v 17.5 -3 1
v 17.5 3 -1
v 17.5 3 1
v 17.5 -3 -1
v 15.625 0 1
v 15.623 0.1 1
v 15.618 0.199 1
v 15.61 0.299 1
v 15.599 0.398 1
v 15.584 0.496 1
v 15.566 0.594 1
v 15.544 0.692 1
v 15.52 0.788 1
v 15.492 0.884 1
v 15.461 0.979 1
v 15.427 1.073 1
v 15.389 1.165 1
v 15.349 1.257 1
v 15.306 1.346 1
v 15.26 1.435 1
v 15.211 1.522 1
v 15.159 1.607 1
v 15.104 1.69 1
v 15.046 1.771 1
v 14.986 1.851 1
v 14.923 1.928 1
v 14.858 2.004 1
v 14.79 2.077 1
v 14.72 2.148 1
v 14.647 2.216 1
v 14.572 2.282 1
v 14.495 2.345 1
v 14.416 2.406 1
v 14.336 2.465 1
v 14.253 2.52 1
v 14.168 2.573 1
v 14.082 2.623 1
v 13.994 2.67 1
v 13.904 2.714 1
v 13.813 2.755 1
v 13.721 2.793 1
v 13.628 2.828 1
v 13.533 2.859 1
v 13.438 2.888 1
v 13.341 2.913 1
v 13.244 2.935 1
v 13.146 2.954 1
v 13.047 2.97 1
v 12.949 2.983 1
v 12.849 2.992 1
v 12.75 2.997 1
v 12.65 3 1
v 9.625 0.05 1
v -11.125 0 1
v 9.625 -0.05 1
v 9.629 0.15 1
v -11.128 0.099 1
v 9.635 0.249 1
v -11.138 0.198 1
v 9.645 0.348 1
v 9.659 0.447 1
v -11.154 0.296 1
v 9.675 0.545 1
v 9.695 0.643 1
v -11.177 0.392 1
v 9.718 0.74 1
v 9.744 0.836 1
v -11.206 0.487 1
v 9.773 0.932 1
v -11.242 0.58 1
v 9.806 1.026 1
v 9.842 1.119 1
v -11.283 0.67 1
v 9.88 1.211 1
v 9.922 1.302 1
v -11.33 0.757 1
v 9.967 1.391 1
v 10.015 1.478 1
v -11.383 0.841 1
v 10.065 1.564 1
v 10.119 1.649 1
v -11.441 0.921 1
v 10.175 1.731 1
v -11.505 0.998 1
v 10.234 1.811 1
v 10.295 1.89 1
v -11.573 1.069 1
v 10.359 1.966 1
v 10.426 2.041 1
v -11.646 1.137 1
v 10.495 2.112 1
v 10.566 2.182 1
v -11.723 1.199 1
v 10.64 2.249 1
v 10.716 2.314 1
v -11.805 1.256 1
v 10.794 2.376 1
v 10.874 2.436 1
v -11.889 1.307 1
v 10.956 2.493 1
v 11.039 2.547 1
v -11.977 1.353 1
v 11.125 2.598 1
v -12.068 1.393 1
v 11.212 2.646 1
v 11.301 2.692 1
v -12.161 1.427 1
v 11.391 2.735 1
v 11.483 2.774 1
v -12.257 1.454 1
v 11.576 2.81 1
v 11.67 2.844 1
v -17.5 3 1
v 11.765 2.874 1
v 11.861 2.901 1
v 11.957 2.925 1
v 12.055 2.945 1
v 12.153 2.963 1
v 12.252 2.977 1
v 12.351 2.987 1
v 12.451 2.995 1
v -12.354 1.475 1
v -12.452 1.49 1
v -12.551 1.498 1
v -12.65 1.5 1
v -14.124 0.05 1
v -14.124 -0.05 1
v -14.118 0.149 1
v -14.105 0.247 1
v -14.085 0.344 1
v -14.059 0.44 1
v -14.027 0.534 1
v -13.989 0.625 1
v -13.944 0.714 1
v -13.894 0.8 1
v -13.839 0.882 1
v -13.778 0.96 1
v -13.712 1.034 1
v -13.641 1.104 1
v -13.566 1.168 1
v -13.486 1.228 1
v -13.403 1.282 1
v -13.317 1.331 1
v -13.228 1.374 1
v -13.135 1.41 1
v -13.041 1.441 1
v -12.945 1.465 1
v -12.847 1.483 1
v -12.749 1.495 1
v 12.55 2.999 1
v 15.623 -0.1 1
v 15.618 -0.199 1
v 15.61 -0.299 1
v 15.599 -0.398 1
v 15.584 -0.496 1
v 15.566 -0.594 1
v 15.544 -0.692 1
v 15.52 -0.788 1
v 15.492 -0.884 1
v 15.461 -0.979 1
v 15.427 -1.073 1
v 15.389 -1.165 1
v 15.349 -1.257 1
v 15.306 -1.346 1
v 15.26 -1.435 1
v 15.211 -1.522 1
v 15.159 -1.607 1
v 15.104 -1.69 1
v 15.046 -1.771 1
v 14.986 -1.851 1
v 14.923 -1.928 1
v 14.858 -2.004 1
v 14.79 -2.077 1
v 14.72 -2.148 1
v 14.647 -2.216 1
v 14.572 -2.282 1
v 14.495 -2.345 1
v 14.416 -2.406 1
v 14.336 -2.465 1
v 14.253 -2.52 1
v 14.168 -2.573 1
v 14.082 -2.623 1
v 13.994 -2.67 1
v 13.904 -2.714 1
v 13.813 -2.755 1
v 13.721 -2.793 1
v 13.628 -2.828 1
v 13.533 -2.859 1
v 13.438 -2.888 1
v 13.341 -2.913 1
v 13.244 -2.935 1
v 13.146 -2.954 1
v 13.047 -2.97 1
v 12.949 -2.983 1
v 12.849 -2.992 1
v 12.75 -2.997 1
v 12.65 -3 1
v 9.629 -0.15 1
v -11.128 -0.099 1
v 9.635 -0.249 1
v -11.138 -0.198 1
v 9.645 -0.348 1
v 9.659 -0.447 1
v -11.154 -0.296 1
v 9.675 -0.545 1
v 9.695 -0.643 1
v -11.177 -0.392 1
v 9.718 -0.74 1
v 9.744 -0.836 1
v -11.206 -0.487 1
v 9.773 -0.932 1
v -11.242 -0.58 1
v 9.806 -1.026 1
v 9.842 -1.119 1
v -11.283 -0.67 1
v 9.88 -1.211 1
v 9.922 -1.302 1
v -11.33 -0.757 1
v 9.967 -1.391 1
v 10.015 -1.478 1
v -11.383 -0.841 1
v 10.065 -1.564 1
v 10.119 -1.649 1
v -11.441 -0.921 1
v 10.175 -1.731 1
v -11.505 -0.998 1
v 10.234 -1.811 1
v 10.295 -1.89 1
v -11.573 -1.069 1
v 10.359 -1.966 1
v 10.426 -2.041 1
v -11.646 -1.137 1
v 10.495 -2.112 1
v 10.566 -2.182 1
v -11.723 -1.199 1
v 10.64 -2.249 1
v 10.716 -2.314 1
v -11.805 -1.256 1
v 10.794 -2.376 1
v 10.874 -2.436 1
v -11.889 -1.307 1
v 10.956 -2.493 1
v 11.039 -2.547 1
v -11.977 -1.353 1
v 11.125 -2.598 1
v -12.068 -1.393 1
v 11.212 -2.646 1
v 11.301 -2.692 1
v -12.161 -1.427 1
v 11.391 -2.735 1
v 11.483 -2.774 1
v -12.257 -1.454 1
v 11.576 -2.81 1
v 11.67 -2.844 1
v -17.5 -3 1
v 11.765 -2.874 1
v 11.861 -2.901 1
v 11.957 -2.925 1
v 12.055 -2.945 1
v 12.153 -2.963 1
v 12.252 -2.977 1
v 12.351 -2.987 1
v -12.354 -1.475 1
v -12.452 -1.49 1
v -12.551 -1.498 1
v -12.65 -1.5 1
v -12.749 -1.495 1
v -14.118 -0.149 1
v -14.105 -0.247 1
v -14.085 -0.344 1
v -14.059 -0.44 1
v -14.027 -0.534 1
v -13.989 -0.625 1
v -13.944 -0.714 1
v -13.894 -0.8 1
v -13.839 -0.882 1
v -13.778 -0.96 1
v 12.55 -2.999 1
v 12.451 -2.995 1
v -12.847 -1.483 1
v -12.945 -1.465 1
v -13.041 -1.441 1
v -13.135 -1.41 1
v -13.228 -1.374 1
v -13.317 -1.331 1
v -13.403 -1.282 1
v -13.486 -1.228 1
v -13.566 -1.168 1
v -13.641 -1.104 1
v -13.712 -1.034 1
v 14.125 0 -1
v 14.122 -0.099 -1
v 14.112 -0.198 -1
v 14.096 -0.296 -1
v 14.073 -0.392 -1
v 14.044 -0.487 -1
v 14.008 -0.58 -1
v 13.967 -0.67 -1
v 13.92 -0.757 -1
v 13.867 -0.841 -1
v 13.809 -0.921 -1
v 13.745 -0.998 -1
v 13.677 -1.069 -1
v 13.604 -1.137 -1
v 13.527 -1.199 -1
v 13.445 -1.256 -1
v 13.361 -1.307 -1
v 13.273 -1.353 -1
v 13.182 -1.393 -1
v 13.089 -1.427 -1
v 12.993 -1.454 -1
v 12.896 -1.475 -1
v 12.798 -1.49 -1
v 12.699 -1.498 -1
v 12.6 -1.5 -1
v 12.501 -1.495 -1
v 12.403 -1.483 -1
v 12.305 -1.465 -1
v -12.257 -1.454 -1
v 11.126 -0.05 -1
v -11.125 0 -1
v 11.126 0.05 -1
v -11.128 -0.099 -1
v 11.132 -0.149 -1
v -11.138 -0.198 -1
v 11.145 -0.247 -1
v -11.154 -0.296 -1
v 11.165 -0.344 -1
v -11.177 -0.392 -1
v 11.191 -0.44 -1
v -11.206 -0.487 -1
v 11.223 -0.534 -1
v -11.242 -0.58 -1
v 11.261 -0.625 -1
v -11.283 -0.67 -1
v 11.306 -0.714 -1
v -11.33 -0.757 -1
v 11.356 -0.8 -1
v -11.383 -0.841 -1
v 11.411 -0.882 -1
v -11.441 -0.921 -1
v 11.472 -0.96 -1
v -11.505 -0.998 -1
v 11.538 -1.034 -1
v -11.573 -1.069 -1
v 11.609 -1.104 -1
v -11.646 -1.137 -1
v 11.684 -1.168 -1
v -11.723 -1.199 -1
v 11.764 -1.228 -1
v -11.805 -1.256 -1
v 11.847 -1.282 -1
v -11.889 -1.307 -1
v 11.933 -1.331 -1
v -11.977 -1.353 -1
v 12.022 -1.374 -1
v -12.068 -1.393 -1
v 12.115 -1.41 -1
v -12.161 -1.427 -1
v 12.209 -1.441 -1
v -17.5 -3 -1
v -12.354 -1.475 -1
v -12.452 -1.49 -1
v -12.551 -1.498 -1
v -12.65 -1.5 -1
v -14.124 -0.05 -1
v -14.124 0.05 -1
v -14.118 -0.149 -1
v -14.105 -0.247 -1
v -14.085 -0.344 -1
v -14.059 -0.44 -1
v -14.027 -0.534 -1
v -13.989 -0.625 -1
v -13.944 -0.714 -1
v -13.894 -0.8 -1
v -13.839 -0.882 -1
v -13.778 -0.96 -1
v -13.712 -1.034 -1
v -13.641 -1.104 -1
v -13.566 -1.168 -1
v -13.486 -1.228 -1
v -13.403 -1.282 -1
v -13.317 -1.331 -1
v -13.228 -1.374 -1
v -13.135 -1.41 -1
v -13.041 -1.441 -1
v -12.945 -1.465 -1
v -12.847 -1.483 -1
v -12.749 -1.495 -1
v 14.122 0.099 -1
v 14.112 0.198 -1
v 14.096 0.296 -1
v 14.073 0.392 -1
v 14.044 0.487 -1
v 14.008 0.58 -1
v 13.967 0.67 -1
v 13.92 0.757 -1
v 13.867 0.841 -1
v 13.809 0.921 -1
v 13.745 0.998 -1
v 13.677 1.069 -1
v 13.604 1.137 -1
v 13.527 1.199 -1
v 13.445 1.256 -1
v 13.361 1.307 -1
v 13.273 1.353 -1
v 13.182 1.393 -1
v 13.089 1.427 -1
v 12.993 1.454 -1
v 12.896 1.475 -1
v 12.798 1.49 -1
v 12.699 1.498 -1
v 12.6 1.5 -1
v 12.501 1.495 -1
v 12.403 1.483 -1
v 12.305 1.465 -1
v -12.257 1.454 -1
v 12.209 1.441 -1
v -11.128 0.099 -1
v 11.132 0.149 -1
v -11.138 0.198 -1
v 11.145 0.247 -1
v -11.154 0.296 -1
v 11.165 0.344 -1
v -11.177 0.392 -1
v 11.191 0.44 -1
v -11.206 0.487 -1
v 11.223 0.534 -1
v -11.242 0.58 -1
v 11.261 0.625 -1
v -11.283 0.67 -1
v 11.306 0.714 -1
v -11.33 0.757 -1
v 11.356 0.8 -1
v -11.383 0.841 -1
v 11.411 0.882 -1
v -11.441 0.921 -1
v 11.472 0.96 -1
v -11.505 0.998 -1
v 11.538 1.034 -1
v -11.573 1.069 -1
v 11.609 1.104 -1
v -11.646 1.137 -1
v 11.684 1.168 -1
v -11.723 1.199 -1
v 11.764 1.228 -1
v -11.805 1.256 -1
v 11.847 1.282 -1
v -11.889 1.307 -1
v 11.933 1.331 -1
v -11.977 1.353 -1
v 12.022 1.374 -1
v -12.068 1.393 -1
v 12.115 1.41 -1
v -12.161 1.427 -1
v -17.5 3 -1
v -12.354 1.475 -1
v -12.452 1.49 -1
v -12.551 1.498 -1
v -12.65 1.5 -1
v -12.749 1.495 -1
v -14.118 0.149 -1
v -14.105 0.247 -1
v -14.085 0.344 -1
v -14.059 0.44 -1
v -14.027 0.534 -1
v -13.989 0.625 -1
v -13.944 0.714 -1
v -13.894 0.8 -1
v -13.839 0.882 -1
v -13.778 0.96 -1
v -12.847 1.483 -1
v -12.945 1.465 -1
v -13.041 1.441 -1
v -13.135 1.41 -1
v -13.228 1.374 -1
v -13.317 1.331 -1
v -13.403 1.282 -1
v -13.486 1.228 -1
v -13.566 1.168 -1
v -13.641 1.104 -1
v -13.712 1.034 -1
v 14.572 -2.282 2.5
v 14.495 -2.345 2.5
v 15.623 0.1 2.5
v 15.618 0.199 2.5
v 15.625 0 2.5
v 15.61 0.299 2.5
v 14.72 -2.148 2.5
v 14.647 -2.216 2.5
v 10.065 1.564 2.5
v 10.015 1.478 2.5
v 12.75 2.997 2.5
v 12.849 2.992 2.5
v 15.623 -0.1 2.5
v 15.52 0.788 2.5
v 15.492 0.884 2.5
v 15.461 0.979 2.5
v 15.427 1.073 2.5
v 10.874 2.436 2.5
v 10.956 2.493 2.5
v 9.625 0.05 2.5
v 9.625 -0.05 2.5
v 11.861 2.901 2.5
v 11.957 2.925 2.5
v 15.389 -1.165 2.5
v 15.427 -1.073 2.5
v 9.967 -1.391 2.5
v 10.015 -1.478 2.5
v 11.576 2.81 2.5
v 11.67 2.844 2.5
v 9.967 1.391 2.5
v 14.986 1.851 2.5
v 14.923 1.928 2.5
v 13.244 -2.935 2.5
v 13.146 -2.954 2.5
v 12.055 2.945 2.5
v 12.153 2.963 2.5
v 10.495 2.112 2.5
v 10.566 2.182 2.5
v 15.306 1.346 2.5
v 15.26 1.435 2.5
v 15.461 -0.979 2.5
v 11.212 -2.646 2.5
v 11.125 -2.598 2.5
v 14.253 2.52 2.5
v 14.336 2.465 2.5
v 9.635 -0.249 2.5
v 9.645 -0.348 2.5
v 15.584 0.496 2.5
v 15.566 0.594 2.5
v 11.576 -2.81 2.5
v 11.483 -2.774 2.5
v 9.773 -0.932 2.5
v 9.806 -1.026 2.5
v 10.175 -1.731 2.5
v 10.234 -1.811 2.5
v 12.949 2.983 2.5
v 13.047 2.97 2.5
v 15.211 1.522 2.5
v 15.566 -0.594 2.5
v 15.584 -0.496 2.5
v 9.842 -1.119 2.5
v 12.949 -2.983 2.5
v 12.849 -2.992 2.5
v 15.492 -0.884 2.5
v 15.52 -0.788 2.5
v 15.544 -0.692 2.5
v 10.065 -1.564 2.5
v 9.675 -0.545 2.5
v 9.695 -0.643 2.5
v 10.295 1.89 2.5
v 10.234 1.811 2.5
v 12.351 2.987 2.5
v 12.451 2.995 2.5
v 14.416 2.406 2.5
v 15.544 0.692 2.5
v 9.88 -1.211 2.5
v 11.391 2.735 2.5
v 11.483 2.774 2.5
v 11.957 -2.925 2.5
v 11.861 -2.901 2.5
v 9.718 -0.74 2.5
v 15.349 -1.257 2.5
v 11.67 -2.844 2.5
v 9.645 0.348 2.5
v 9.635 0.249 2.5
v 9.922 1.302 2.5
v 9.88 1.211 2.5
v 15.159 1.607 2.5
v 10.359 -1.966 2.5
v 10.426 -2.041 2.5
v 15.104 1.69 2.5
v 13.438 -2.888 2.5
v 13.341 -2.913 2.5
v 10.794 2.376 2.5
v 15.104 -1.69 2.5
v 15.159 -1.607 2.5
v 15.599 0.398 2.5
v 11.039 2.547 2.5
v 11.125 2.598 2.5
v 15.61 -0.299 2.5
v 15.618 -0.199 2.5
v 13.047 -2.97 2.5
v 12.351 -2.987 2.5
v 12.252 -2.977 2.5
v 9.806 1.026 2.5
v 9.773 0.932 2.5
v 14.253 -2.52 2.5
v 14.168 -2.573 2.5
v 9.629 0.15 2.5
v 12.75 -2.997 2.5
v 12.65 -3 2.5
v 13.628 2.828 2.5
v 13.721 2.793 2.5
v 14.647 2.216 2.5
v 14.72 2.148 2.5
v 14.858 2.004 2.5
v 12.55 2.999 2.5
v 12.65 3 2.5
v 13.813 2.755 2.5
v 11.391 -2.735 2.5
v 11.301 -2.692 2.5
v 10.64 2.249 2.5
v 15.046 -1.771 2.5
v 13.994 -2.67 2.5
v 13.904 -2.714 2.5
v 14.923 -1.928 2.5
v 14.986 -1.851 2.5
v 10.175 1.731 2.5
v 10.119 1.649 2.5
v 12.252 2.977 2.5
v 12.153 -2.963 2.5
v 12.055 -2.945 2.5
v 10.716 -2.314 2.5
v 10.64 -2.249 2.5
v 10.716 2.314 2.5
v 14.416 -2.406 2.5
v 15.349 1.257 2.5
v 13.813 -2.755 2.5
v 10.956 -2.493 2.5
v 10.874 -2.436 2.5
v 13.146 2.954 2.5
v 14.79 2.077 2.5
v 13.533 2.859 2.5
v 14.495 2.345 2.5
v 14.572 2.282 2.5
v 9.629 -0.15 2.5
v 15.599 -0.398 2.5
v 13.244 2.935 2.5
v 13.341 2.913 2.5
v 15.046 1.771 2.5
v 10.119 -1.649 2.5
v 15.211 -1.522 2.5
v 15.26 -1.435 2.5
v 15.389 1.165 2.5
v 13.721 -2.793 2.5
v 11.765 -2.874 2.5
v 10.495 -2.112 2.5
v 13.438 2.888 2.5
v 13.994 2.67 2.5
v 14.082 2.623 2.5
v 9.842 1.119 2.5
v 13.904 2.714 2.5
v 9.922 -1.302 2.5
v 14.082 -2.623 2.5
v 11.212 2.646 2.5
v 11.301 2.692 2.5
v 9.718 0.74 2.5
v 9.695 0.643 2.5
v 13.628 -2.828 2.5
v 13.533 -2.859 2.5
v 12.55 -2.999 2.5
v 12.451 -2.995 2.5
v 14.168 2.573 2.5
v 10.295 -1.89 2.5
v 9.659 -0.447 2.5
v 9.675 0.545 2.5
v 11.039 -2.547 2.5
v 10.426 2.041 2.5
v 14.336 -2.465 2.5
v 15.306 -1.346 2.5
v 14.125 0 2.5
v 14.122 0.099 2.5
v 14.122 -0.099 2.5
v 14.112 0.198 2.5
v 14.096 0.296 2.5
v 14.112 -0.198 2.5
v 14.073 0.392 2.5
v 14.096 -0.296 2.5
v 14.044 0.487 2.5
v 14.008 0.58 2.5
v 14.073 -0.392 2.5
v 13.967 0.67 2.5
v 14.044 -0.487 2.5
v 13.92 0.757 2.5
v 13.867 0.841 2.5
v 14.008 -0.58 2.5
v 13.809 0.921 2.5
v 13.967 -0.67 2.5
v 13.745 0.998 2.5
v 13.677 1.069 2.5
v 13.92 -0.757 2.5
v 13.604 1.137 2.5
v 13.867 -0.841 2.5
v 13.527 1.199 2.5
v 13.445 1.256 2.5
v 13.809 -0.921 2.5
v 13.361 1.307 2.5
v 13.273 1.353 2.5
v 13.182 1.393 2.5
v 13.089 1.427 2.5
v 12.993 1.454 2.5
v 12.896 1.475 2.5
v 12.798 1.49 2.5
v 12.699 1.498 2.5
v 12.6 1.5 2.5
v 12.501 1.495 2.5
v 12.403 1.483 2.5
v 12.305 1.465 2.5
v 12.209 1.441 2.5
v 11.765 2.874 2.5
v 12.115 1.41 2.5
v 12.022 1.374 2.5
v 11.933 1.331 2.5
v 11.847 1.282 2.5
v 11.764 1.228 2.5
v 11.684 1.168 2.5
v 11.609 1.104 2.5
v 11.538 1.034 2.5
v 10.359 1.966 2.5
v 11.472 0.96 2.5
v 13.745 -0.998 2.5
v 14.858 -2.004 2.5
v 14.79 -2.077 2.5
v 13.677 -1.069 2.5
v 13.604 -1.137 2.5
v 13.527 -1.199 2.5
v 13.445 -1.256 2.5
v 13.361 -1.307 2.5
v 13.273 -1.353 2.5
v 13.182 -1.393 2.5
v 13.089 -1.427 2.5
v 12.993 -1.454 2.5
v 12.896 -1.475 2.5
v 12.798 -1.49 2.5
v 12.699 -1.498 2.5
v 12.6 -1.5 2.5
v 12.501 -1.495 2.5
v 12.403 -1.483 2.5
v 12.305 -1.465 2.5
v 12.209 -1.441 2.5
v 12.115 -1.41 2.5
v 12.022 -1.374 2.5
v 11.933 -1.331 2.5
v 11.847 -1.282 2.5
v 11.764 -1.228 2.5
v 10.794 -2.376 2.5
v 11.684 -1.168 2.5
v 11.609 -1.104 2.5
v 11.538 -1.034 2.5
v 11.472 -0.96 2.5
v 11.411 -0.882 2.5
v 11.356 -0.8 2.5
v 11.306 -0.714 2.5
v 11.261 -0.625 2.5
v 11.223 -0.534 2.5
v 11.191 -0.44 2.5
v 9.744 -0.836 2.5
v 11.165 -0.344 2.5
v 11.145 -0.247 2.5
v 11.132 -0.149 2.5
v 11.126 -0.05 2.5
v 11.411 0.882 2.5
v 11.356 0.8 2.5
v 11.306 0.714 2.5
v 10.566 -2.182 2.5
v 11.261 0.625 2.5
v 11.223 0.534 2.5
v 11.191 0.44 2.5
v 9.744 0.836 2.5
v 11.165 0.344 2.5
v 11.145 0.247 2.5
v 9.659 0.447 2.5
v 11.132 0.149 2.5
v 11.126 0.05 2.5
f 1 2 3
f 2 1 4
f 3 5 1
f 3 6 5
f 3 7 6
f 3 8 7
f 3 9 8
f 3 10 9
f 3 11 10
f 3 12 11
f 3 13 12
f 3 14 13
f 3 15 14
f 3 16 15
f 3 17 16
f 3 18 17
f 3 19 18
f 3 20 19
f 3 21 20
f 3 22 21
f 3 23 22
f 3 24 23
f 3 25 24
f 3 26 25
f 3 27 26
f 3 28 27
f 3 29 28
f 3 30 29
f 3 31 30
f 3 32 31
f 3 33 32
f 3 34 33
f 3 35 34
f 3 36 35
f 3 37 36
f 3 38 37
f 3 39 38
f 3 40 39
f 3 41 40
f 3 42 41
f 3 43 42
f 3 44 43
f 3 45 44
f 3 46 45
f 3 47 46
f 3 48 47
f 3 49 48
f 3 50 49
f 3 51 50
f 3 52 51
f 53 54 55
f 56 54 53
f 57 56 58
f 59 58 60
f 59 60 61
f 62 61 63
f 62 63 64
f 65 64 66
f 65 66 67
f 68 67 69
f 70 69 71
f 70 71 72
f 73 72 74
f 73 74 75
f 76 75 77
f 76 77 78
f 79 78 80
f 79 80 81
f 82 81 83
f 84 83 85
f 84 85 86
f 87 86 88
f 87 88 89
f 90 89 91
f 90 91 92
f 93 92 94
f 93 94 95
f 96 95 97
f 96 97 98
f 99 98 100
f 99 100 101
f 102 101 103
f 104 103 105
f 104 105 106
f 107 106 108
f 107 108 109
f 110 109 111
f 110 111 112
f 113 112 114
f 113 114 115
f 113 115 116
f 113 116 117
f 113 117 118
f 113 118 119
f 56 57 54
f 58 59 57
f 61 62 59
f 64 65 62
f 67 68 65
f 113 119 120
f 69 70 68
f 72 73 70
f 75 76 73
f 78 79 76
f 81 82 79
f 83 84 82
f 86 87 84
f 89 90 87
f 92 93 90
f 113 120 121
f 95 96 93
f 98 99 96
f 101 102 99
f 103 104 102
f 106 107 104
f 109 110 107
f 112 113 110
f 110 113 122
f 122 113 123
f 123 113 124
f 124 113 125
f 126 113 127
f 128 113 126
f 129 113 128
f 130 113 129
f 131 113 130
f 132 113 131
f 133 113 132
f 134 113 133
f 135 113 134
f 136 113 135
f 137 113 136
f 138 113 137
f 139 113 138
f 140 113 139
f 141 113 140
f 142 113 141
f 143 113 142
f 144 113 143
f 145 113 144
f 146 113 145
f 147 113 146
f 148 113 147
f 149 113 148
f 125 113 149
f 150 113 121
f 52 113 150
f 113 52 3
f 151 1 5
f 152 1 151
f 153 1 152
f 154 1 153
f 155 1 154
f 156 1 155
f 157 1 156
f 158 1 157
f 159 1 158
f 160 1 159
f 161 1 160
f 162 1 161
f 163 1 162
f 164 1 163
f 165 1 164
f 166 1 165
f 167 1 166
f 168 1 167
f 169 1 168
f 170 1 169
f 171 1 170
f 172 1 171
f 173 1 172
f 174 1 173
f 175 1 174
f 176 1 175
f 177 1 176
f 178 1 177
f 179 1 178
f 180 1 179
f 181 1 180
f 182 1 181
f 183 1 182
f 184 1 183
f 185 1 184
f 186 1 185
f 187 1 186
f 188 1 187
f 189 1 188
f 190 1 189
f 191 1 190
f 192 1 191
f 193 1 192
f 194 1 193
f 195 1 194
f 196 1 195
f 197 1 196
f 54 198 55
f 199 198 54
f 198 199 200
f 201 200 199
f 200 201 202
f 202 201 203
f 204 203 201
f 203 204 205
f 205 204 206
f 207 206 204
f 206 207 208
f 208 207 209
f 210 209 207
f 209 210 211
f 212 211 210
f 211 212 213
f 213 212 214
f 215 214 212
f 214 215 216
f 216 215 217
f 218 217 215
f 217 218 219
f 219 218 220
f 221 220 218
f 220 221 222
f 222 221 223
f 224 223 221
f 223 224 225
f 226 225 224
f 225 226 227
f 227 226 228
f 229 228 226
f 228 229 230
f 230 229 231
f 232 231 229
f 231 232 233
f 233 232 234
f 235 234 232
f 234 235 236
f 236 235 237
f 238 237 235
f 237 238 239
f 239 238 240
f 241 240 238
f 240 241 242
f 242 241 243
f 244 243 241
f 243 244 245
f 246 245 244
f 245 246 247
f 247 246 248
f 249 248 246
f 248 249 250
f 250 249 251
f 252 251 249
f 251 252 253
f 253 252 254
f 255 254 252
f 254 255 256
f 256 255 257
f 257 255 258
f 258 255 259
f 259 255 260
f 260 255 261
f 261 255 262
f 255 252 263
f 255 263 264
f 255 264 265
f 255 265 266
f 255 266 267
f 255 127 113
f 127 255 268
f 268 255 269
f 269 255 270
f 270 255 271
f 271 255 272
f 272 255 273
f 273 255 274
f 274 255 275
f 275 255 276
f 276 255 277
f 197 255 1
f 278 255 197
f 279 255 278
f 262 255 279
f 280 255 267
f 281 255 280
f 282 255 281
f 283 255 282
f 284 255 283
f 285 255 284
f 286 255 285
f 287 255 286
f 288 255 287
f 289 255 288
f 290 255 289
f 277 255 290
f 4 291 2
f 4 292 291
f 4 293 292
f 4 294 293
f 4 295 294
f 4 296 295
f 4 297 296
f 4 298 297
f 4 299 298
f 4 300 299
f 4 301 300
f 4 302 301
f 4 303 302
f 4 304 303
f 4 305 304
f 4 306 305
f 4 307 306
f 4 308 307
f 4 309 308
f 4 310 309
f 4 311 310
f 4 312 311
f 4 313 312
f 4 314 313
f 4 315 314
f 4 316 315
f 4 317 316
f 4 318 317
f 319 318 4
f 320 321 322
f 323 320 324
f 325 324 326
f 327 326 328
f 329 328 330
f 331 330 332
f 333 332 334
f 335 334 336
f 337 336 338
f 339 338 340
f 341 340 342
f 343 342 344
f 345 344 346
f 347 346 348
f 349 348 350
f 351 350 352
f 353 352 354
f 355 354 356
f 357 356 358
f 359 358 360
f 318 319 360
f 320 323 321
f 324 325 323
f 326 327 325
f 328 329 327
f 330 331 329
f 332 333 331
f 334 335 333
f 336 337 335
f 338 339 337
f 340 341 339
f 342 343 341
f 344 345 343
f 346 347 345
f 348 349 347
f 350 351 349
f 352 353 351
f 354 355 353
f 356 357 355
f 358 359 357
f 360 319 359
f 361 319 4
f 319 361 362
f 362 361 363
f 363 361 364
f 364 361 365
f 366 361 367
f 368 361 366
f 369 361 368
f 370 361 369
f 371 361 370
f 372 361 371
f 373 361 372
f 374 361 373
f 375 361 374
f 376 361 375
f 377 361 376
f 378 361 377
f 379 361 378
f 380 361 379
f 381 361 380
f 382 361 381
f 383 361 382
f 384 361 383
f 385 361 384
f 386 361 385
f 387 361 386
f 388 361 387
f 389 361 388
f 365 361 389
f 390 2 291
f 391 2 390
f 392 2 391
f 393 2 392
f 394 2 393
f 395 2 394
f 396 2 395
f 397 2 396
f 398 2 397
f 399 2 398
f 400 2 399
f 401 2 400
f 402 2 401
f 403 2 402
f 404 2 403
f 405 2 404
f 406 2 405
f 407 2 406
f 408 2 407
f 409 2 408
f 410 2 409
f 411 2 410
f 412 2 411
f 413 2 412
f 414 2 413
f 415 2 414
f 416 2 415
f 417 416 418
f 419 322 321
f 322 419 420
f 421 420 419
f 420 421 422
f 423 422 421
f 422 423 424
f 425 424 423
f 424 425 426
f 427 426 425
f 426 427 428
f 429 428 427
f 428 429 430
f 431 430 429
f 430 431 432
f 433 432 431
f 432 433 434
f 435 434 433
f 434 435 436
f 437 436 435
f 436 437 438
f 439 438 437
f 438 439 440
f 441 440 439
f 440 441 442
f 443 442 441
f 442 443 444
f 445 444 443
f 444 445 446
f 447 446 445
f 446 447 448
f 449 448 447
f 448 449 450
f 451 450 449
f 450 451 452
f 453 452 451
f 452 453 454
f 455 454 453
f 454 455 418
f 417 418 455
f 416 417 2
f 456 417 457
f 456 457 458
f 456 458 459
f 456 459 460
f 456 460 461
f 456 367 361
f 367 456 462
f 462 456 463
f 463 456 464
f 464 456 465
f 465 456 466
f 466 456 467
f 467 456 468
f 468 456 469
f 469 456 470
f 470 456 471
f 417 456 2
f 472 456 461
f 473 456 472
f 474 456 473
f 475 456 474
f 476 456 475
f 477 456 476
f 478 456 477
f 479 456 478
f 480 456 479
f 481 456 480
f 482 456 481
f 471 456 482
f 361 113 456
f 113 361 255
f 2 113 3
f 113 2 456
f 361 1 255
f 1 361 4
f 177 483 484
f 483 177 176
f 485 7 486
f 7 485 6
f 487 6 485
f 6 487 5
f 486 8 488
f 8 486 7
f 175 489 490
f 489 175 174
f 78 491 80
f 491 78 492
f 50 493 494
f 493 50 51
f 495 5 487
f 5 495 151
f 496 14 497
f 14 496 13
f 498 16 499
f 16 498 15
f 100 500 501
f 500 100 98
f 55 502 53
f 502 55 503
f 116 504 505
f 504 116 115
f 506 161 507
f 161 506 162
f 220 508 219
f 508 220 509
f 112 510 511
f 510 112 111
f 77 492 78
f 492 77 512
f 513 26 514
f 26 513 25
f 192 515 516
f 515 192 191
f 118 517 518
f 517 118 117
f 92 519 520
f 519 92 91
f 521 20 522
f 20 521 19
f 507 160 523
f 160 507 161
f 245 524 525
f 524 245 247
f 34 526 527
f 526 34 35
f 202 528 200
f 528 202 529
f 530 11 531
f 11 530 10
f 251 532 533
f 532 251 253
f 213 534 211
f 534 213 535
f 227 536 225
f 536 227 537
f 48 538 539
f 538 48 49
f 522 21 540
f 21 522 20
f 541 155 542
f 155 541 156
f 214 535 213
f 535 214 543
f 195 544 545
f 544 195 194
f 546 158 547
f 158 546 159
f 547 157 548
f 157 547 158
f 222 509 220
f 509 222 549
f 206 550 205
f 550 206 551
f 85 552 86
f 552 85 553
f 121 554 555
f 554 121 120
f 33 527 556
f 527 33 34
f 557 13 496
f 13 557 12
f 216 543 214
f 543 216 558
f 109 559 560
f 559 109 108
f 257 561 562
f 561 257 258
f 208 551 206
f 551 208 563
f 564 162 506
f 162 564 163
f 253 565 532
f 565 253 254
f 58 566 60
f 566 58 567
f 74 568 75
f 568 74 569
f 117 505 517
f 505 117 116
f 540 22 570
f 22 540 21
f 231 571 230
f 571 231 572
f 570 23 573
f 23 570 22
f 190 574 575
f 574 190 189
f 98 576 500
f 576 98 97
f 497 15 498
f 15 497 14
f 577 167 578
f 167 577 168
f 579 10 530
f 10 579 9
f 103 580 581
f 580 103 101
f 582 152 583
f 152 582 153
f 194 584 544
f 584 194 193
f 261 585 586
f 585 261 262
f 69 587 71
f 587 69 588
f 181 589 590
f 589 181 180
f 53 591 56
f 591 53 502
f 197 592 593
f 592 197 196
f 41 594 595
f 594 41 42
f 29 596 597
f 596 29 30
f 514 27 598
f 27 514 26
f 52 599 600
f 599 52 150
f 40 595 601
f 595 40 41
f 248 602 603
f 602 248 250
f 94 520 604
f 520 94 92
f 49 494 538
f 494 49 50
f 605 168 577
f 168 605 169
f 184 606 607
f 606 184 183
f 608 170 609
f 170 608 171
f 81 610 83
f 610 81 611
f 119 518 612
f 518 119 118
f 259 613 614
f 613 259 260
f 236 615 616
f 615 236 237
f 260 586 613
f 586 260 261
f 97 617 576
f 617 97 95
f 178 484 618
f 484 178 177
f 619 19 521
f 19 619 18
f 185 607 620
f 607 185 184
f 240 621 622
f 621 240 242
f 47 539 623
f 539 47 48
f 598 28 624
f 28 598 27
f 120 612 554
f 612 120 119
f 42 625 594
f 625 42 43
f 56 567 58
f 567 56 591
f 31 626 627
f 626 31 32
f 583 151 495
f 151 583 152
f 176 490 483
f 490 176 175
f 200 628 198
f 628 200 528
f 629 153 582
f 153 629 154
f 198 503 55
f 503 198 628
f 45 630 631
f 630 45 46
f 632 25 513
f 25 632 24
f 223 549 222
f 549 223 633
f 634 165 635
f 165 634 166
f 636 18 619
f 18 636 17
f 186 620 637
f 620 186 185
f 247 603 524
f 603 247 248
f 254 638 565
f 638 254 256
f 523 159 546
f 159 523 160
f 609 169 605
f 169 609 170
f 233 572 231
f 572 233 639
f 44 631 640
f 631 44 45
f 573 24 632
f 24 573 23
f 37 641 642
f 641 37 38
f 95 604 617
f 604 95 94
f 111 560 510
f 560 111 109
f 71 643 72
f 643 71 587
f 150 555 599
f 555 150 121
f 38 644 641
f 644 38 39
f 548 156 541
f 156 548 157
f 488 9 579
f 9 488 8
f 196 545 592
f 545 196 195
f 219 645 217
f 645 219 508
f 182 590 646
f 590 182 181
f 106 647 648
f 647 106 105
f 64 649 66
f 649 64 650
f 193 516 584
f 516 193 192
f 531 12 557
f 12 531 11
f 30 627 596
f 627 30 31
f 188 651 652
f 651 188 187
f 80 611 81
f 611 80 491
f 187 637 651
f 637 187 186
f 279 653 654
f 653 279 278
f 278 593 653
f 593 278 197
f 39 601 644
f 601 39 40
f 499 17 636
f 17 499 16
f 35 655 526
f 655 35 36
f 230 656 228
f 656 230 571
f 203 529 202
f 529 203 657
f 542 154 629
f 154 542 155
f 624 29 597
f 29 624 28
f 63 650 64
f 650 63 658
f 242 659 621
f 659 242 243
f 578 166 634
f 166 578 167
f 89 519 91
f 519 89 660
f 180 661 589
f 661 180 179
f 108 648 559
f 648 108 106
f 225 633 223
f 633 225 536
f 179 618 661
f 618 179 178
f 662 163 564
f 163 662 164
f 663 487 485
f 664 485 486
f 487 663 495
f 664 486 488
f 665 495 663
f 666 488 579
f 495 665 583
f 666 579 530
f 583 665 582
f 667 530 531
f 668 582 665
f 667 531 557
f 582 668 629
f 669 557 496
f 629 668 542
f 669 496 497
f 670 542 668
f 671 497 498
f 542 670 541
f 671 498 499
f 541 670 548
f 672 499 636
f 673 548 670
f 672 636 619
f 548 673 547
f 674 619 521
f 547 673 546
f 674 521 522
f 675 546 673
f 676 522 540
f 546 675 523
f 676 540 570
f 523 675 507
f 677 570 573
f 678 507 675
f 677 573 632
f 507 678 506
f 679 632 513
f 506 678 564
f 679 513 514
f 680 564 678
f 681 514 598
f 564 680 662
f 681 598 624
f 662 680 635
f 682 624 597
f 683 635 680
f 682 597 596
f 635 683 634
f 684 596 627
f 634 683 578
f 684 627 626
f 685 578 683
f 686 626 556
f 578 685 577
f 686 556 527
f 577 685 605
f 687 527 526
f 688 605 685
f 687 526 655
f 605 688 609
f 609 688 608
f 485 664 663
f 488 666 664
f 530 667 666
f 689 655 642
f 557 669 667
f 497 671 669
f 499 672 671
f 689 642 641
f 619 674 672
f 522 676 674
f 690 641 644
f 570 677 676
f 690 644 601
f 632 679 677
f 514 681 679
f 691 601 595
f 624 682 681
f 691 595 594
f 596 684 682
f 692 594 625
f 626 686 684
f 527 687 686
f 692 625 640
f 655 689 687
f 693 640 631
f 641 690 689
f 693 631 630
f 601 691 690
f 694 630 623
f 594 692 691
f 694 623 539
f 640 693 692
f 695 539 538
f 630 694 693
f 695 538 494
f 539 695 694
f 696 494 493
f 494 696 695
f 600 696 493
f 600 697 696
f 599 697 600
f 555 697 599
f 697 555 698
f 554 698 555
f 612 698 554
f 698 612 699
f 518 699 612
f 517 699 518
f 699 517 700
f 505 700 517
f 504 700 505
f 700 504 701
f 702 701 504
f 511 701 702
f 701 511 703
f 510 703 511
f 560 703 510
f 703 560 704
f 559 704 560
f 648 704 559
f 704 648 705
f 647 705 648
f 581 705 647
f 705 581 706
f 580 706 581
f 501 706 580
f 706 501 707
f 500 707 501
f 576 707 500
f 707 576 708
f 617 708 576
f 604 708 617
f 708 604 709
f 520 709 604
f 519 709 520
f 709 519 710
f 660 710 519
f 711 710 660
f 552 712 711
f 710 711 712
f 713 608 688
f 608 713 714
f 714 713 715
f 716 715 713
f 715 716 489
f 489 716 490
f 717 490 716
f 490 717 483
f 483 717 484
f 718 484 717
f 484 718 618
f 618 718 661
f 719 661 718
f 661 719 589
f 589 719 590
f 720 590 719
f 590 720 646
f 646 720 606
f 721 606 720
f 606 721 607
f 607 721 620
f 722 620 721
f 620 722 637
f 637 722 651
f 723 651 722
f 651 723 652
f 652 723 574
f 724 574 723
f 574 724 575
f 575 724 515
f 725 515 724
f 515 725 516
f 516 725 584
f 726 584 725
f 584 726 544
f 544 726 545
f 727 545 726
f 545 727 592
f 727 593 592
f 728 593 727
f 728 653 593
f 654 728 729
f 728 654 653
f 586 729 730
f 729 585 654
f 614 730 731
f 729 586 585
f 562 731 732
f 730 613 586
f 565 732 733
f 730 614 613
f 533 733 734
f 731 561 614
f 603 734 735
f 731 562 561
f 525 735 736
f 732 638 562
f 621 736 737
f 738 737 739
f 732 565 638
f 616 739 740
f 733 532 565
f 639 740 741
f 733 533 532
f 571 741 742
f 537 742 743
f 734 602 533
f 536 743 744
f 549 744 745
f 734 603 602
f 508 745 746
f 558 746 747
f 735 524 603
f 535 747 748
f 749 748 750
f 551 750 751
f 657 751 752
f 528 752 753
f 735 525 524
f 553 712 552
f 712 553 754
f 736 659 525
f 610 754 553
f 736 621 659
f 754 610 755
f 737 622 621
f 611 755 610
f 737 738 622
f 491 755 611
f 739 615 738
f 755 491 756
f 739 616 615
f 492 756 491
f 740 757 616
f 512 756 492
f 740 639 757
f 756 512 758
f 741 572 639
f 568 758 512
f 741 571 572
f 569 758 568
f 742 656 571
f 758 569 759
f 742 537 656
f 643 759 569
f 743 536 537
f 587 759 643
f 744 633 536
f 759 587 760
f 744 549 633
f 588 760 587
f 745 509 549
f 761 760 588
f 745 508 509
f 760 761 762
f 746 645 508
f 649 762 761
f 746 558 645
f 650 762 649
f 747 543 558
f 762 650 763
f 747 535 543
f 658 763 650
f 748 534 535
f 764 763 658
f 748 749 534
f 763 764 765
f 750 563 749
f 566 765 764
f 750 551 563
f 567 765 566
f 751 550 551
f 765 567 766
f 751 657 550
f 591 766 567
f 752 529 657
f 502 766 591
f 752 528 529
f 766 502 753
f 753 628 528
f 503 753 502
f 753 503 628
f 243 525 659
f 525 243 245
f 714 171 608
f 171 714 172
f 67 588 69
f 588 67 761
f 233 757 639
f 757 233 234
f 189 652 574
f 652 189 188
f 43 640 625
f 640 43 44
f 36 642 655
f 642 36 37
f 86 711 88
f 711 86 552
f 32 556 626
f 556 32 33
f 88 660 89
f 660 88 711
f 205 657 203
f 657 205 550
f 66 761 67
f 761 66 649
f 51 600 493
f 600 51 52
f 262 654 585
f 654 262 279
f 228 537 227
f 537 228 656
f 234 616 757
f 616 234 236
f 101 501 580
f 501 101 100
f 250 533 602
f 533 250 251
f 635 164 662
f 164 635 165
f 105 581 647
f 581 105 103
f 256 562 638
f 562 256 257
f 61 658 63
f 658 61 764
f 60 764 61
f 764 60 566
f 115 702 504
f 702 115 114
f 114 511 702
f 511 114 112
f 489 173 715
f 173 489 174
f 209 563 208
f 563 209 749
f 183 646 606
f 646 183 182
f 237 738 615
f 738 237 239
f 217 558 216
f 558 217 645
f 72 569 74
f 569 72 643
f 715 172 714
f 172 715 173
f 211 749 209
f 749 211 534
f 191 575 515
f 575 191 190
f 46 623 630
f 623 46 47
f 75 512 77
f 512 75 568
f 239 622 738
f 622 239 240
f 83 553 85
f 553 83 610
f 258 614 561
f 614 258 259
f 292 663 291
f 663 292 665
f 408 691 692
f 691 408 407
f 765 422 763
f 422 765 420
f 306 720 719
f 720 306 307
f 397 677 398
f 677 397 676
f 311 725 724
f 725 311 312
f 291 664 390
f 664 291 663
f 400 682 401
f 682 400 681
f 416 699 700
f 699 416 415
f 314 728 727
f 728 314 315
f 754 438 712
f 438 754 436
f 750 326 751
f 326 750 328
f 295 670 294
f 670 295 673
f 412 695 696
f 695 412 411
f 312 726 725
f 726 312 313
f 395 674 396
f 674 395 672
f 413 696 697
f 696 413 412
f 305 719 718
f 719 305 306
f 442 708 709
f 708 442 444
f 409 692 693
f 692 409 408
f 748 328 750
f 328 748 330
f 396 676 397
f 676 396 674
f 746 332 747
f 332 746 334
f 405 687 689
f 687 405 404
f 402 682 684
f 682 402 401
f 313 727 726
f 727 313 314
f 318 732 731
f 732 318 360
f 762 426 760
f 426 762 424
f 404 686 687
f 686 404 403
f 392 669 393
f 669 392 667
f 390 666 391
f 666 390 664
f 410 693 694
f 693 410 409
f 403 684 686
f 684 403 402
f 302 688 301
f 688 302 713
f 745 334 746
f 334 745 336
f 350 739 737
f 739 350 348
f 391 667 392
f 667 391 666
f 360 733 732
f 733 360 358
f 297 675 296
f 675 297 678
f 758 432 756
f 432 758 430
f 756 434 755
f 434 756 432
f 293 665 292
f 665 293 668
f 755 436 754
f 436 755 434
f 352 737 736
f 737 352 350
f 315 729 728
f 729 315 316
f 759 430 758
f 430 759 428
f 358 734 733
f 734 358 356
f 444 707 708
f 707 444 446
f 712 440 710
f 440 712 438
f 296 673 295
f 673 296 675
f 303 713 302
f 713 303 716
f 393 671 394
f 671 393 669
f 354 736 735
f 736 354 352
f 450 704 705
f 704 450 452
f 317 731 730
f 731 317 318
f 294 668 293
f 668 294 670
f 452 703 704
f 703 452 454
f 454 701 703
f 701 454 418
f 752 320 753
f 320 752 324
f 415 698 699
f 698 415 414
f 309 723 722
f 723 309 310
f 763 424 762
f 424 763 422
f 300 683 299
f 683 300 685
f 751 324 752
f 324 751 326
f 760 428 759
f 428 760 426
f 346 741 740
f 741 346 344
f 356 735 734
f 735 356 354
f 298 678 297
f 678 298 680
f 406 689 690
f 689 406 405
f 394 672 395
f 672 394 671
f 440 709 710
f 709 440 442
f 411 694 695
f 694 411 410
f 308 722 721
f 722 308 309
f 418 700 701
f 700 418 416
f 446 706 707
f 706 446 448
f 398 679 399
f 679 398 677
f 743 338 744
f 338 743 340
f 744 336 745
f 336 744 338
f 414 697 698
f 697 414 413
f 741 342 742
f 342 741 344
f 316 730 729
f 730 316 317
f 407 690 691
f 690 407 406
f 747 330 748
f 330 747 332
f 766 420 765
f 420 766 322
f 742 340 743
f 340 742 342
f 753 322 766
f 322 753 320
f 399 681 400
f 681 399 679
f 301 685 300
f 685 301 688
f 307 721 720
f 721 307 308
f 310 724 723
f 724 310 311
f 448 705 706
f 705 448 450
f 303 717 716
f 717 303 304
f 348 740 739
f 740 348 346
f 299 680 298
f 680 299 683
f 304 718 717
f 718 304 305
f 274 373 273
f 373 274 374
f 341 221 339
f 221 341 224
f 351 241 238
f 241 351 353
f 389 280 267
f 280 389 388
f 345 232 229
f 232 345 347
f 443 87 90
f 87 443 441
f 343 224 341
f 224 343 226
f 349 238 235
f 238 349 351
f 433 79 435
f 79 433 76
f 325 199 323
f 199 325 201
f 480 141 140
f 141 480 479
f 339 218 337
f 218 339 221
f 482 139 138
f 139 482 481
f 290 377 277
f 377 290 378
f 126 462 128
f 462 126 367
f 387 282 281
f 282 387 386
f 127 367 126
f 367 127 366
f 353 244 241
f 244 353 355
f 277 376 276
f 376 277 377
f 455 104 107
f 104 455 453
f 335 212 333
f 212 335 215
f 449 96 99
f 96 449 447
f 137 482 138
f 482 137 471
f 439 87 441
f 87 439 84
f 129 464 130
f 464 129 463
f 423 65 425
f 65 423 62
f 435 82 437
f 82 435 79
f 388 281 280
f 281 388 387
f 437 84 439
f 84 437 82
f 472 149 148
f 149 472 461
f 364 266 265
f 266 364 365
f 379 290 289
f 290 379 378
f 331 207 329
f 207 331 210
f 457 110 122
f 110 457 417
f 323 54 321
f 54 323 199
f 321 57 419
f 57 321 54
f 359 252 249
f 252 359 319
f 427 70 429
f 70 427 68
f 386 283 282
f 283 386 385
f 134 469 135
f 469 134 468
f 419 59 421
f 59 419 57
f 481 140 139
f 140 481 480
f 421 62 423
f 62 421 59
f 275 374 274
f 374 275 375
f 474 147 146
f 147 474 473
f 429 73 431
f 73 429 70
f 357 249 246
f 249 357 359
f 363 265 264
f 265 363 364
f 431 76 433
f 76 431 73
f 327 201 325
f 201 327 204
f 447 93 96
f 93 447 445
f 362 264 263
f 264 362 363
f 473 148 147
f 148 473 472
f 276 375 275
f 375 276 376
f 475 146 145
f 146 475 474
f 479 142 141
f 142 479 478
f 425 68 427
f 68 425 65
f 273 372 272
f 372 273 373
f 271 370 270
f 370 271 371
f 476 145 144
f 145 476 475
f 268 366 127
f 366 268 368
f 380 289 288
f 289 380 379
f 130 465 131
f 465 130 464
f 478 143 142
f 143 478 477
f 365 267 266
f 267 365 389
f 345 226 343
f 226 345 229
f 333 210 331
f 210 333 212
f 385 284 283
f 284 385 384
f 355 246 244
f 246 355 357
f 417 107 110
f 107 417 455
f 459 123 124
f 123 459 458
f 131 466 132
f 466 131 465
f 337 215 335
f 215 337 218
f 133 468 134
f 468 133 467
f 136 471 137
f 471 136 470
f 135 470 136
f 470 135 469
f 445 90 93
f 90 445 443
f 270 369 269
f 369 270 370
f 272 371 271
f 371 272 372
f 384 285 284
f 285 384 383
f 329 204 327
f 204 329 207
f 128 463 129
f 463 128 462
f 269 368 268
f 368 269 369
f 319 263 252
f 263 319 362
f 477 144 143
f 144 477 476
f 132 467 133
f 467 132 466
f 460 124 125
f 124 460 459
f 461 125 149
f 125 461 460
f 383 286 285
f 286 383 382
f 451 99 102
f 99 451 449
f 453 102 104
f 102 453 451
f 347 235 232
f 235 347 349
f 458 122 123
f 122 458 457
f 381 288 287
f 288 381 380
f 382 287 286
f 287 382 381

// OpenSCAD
// file: functions.scad
/////////////////////////////////////////////////////////////////////////////////////////////////////////////////////////
// Auto generate a rectangle with rounded edges and corners
/////////////////////////////////////////////////////////////////////////////////////////////////////////////////////////
module rect_round(length,width,depth,rad) {
    
    // long sides
    l1 = length - 2*rad;
      
    // wide sides
    w1 = width - 2*rad;
    
    // deep sides
    d1 = depth - 2 * rad;
    
    // central rect l1 x w1 x d1
    
    union() {
        // corner spheres - locations defined by l1 w1 d1
        for ( i = [-1,1] ) {
            for ( j = [-1,1] ) {
                for ( k = [-1,1] ) {
                    //spheres
                    translate([i*(l1/2),j*(w1/2),k*(d1/2)]){
                        sphere(r = rad, center = true);                        
                        }  
                    }
                }
            }
        
        // face rectangles
        for ( i = [-1,1] ) {
            
            //x
            translate([i*(l1+rad)/2,0,0]){
                cube([rad,w1,d1],center=true); 
                }
            //y
            translate([0,i*(w1+rad)/2,0]){
                cube([l1,rad,d1],center=true); 
                }
            //z
            translate([0,0,i*(d1+rad)/2]){
                cube([l1,w1,rad],center=true); 
                }
            }
         // edge cylinders       
         for ( i = [-1,1] ) {
             for ( j = [-1,1] ){
            // short
            translate([i*(l1/2),j*(w1/2),0]){
                cylinder(h=d1 ,r=rad, center=true); 
                }
            // mid
            translate([i*(l1/2),0,j*(d1/2)]){
                rotate(a=90,v=[1,0,0]){
                    cylinder(h=w1 ,r=rad, center=true);
                    }
                }
            // long
            translate([0,i*(w1/2),j*(d1/2)]){
                rotate(a=90,v=[0,1,0]){
                    cylinder(h=l1 ,r=rad, center=true);
                    }
                }
            }
            }  
            // central cube
            cube([l1,w1,d1],center=true);
        }
    }
//////////////////////////////////////////////////////////////////////////////////////////////////////////////////

//////////////////////////////////////////////////////////////////////////////////////////////////////////////////
// Auto generate cutouts for nuts, where length is the distance b/w parallel sides and thickness is the nut thickness or cutout depth
/////////////////////////////////////////////////////////////////////////////////////////////////////////////////////////
module hex_nut_cutout(length, thickness) {



   
   hex_side_length = length / sqrt(3);

   union(){
      cube([hex_side_length,thickness,length], center=true);
      rotate([0,60,0]){cube([hex_side_length,thickness,length], center=true);}
      rotate([0,120,0]){cube([hex_side_length,thickness,length], center=true);}
   }
}
/////////////////////////////////////////////////////////////////////////////////////////////////////////////////////////

/////////////////////////////////////////////////////////////////////////////////////////////////////////////////////////
// Auto generate a spherical section with a flat face, where radius is the radius  of the sphere, and fraction is the of the diameter required
/////////////////////////////////////////////////////////////////////////////////////////////////////////////////////////
module  sphere_fraction(radius, fraction) {

difference() {
   
   sphere( r=radius, center=true);

   translate( [ 0, 0, -(fraction)*radius]){ cube([ 2.01*radius, 2.01*radius, 2.001*(1-fraction)*radius], center=true);}

}
}
/////////////////////////////////////////////////////////////////////////////////////////////////////////////////////////

/////////////////////////////////////////////////////////////////////////////////////////////////////////////////////////
// Gear Generator
/////////////////////////////////////////////////////////////////////////////////////////////////////////////////////////

module gear_generator( number_of_teeth, pitch, thickness, pivot ){

// Calculated
P = PI / pitch;
diameter = number_of_teeth/P;


a = 1/P;
b = 1.25/P;
ht = 2.25/P;
c = 0.25/P;
rf = 0.30/P;
Db = diameter*cos(20);
Do = (number_of_teeth+2)/P;
Dr = (number_of_teeth-2.5)/P;
t = 1.5708/P;
r = diameter/2;
h = diameter-Db;

l = 0.5*Db - 0.5*diameter*sin(360/(4*number_of_teeth));
//l = 0.5*Db -t/2;

echo(diameter,a,b,ht,c,rf,Db/2,Do,Dr,t,r,h,l);

// Bevel the edges
run = 0.5*(Do-diameter);
rise = 0.364*run;
bulk = thickness - 2*rise;
disp = thickness/2 - 0.5*rise;

echo(run, rise, bulk, disp);


difference(){
intersection(){
//envelope
union(){
translate([0,0, disp]){cylinder(r1 = Do/2, r2 = Do/2-run, h=rise,center=true); }
cylinder(r = Do/2, h=bulk, center=true);
translate([0,0,-disp]){cylinder(r1 = Do/2-run, r2 = Do/2, h=rise,center=true); }
}

//union(){
//translate([0,0,(1/2)*thickness]){cylinder(r1 =  }
//cylinder(r = Do/2, h=(2/3)*thickness, center=true);
//}

union(){
cylinder(r = Dr/2, h=thickness, center=true);
for(i=[1:number_of_teeth]){

angle = (i-1)*360/number_of_teeth;

rotate( [ 0, 0, angle] ){
   translate( [ 0.5*Db, 0, 0] ) {
         intersection() {
         translate([0,l,0]){cylinder( r = 0.5*Db, h=thickness, center=true);}
         translate([0,-l,0]){cylinder( r = 0.5*Db, h=thickness, center=true);}
         }
      }
   }
}
}
}

cylinder(r=pivot, h=thickness+1, center=true);
}
}
/////////////////////////////////////////////////////////////////////////////////////////////////////////////////////////

/////////////////////////////////////////////////////////////////////////////////////////////////////////////////////////
// Rounded Edges for Extrusions
/////////////////////////////////////////////////////////////////////////////////////////////////////////////////////////

module round_edge_extrusion( cor_rad, tot_dep) {

dep = tot_dep - 2*cor_rad;
offset = 0.5*dep;


// shape to be extruded
union() {
// radius
for( i=[0,1]) {

translate( [ 0, cos(180*i)*offset, 0] ) {
rotate_extrude( angle = 90-i*180 ) {
translate( [ cor_rad-0.5*cor_rad, 0, 0] ) {square( [cor_rad, 1], center=true);}
}
}
}

translate( [ cor_rad-0.5*cor_rad, 0, 0] ) {cube([ cor_rad, dep, 1], center=true);}

}
}
/////////////////////////////////////////////////////////////////////////////////////////////////////////////////////////
// main file
use <functions.scad>

  $fa=.1; // default minimum facet angle is now 0.5
  $fs=.1; // default minimum facet size is now 0.5 mm

pin_spacing = 1.01*(20 + 5);
pin_radius = 1.5;
pin_height = 1.5;

difference(){

union(){
cube( [ 35, 6, 2], center=true);
translate( [ 0.5*pin_spacing, 0, 0.5*pin_height + 1]){cylinder( r = 2*pin_radius, h = pin_height, center=true);}
}

union(){
translate( [ 0.5*pin_spacing, 0, 0]){cylinder( r = pin_radius, h = 10, center=true);}
translate( [ -0.5*pin_spacing, 0, 0]){cylinder( r = pin_radius, h = 10, center=true);}

}

}
